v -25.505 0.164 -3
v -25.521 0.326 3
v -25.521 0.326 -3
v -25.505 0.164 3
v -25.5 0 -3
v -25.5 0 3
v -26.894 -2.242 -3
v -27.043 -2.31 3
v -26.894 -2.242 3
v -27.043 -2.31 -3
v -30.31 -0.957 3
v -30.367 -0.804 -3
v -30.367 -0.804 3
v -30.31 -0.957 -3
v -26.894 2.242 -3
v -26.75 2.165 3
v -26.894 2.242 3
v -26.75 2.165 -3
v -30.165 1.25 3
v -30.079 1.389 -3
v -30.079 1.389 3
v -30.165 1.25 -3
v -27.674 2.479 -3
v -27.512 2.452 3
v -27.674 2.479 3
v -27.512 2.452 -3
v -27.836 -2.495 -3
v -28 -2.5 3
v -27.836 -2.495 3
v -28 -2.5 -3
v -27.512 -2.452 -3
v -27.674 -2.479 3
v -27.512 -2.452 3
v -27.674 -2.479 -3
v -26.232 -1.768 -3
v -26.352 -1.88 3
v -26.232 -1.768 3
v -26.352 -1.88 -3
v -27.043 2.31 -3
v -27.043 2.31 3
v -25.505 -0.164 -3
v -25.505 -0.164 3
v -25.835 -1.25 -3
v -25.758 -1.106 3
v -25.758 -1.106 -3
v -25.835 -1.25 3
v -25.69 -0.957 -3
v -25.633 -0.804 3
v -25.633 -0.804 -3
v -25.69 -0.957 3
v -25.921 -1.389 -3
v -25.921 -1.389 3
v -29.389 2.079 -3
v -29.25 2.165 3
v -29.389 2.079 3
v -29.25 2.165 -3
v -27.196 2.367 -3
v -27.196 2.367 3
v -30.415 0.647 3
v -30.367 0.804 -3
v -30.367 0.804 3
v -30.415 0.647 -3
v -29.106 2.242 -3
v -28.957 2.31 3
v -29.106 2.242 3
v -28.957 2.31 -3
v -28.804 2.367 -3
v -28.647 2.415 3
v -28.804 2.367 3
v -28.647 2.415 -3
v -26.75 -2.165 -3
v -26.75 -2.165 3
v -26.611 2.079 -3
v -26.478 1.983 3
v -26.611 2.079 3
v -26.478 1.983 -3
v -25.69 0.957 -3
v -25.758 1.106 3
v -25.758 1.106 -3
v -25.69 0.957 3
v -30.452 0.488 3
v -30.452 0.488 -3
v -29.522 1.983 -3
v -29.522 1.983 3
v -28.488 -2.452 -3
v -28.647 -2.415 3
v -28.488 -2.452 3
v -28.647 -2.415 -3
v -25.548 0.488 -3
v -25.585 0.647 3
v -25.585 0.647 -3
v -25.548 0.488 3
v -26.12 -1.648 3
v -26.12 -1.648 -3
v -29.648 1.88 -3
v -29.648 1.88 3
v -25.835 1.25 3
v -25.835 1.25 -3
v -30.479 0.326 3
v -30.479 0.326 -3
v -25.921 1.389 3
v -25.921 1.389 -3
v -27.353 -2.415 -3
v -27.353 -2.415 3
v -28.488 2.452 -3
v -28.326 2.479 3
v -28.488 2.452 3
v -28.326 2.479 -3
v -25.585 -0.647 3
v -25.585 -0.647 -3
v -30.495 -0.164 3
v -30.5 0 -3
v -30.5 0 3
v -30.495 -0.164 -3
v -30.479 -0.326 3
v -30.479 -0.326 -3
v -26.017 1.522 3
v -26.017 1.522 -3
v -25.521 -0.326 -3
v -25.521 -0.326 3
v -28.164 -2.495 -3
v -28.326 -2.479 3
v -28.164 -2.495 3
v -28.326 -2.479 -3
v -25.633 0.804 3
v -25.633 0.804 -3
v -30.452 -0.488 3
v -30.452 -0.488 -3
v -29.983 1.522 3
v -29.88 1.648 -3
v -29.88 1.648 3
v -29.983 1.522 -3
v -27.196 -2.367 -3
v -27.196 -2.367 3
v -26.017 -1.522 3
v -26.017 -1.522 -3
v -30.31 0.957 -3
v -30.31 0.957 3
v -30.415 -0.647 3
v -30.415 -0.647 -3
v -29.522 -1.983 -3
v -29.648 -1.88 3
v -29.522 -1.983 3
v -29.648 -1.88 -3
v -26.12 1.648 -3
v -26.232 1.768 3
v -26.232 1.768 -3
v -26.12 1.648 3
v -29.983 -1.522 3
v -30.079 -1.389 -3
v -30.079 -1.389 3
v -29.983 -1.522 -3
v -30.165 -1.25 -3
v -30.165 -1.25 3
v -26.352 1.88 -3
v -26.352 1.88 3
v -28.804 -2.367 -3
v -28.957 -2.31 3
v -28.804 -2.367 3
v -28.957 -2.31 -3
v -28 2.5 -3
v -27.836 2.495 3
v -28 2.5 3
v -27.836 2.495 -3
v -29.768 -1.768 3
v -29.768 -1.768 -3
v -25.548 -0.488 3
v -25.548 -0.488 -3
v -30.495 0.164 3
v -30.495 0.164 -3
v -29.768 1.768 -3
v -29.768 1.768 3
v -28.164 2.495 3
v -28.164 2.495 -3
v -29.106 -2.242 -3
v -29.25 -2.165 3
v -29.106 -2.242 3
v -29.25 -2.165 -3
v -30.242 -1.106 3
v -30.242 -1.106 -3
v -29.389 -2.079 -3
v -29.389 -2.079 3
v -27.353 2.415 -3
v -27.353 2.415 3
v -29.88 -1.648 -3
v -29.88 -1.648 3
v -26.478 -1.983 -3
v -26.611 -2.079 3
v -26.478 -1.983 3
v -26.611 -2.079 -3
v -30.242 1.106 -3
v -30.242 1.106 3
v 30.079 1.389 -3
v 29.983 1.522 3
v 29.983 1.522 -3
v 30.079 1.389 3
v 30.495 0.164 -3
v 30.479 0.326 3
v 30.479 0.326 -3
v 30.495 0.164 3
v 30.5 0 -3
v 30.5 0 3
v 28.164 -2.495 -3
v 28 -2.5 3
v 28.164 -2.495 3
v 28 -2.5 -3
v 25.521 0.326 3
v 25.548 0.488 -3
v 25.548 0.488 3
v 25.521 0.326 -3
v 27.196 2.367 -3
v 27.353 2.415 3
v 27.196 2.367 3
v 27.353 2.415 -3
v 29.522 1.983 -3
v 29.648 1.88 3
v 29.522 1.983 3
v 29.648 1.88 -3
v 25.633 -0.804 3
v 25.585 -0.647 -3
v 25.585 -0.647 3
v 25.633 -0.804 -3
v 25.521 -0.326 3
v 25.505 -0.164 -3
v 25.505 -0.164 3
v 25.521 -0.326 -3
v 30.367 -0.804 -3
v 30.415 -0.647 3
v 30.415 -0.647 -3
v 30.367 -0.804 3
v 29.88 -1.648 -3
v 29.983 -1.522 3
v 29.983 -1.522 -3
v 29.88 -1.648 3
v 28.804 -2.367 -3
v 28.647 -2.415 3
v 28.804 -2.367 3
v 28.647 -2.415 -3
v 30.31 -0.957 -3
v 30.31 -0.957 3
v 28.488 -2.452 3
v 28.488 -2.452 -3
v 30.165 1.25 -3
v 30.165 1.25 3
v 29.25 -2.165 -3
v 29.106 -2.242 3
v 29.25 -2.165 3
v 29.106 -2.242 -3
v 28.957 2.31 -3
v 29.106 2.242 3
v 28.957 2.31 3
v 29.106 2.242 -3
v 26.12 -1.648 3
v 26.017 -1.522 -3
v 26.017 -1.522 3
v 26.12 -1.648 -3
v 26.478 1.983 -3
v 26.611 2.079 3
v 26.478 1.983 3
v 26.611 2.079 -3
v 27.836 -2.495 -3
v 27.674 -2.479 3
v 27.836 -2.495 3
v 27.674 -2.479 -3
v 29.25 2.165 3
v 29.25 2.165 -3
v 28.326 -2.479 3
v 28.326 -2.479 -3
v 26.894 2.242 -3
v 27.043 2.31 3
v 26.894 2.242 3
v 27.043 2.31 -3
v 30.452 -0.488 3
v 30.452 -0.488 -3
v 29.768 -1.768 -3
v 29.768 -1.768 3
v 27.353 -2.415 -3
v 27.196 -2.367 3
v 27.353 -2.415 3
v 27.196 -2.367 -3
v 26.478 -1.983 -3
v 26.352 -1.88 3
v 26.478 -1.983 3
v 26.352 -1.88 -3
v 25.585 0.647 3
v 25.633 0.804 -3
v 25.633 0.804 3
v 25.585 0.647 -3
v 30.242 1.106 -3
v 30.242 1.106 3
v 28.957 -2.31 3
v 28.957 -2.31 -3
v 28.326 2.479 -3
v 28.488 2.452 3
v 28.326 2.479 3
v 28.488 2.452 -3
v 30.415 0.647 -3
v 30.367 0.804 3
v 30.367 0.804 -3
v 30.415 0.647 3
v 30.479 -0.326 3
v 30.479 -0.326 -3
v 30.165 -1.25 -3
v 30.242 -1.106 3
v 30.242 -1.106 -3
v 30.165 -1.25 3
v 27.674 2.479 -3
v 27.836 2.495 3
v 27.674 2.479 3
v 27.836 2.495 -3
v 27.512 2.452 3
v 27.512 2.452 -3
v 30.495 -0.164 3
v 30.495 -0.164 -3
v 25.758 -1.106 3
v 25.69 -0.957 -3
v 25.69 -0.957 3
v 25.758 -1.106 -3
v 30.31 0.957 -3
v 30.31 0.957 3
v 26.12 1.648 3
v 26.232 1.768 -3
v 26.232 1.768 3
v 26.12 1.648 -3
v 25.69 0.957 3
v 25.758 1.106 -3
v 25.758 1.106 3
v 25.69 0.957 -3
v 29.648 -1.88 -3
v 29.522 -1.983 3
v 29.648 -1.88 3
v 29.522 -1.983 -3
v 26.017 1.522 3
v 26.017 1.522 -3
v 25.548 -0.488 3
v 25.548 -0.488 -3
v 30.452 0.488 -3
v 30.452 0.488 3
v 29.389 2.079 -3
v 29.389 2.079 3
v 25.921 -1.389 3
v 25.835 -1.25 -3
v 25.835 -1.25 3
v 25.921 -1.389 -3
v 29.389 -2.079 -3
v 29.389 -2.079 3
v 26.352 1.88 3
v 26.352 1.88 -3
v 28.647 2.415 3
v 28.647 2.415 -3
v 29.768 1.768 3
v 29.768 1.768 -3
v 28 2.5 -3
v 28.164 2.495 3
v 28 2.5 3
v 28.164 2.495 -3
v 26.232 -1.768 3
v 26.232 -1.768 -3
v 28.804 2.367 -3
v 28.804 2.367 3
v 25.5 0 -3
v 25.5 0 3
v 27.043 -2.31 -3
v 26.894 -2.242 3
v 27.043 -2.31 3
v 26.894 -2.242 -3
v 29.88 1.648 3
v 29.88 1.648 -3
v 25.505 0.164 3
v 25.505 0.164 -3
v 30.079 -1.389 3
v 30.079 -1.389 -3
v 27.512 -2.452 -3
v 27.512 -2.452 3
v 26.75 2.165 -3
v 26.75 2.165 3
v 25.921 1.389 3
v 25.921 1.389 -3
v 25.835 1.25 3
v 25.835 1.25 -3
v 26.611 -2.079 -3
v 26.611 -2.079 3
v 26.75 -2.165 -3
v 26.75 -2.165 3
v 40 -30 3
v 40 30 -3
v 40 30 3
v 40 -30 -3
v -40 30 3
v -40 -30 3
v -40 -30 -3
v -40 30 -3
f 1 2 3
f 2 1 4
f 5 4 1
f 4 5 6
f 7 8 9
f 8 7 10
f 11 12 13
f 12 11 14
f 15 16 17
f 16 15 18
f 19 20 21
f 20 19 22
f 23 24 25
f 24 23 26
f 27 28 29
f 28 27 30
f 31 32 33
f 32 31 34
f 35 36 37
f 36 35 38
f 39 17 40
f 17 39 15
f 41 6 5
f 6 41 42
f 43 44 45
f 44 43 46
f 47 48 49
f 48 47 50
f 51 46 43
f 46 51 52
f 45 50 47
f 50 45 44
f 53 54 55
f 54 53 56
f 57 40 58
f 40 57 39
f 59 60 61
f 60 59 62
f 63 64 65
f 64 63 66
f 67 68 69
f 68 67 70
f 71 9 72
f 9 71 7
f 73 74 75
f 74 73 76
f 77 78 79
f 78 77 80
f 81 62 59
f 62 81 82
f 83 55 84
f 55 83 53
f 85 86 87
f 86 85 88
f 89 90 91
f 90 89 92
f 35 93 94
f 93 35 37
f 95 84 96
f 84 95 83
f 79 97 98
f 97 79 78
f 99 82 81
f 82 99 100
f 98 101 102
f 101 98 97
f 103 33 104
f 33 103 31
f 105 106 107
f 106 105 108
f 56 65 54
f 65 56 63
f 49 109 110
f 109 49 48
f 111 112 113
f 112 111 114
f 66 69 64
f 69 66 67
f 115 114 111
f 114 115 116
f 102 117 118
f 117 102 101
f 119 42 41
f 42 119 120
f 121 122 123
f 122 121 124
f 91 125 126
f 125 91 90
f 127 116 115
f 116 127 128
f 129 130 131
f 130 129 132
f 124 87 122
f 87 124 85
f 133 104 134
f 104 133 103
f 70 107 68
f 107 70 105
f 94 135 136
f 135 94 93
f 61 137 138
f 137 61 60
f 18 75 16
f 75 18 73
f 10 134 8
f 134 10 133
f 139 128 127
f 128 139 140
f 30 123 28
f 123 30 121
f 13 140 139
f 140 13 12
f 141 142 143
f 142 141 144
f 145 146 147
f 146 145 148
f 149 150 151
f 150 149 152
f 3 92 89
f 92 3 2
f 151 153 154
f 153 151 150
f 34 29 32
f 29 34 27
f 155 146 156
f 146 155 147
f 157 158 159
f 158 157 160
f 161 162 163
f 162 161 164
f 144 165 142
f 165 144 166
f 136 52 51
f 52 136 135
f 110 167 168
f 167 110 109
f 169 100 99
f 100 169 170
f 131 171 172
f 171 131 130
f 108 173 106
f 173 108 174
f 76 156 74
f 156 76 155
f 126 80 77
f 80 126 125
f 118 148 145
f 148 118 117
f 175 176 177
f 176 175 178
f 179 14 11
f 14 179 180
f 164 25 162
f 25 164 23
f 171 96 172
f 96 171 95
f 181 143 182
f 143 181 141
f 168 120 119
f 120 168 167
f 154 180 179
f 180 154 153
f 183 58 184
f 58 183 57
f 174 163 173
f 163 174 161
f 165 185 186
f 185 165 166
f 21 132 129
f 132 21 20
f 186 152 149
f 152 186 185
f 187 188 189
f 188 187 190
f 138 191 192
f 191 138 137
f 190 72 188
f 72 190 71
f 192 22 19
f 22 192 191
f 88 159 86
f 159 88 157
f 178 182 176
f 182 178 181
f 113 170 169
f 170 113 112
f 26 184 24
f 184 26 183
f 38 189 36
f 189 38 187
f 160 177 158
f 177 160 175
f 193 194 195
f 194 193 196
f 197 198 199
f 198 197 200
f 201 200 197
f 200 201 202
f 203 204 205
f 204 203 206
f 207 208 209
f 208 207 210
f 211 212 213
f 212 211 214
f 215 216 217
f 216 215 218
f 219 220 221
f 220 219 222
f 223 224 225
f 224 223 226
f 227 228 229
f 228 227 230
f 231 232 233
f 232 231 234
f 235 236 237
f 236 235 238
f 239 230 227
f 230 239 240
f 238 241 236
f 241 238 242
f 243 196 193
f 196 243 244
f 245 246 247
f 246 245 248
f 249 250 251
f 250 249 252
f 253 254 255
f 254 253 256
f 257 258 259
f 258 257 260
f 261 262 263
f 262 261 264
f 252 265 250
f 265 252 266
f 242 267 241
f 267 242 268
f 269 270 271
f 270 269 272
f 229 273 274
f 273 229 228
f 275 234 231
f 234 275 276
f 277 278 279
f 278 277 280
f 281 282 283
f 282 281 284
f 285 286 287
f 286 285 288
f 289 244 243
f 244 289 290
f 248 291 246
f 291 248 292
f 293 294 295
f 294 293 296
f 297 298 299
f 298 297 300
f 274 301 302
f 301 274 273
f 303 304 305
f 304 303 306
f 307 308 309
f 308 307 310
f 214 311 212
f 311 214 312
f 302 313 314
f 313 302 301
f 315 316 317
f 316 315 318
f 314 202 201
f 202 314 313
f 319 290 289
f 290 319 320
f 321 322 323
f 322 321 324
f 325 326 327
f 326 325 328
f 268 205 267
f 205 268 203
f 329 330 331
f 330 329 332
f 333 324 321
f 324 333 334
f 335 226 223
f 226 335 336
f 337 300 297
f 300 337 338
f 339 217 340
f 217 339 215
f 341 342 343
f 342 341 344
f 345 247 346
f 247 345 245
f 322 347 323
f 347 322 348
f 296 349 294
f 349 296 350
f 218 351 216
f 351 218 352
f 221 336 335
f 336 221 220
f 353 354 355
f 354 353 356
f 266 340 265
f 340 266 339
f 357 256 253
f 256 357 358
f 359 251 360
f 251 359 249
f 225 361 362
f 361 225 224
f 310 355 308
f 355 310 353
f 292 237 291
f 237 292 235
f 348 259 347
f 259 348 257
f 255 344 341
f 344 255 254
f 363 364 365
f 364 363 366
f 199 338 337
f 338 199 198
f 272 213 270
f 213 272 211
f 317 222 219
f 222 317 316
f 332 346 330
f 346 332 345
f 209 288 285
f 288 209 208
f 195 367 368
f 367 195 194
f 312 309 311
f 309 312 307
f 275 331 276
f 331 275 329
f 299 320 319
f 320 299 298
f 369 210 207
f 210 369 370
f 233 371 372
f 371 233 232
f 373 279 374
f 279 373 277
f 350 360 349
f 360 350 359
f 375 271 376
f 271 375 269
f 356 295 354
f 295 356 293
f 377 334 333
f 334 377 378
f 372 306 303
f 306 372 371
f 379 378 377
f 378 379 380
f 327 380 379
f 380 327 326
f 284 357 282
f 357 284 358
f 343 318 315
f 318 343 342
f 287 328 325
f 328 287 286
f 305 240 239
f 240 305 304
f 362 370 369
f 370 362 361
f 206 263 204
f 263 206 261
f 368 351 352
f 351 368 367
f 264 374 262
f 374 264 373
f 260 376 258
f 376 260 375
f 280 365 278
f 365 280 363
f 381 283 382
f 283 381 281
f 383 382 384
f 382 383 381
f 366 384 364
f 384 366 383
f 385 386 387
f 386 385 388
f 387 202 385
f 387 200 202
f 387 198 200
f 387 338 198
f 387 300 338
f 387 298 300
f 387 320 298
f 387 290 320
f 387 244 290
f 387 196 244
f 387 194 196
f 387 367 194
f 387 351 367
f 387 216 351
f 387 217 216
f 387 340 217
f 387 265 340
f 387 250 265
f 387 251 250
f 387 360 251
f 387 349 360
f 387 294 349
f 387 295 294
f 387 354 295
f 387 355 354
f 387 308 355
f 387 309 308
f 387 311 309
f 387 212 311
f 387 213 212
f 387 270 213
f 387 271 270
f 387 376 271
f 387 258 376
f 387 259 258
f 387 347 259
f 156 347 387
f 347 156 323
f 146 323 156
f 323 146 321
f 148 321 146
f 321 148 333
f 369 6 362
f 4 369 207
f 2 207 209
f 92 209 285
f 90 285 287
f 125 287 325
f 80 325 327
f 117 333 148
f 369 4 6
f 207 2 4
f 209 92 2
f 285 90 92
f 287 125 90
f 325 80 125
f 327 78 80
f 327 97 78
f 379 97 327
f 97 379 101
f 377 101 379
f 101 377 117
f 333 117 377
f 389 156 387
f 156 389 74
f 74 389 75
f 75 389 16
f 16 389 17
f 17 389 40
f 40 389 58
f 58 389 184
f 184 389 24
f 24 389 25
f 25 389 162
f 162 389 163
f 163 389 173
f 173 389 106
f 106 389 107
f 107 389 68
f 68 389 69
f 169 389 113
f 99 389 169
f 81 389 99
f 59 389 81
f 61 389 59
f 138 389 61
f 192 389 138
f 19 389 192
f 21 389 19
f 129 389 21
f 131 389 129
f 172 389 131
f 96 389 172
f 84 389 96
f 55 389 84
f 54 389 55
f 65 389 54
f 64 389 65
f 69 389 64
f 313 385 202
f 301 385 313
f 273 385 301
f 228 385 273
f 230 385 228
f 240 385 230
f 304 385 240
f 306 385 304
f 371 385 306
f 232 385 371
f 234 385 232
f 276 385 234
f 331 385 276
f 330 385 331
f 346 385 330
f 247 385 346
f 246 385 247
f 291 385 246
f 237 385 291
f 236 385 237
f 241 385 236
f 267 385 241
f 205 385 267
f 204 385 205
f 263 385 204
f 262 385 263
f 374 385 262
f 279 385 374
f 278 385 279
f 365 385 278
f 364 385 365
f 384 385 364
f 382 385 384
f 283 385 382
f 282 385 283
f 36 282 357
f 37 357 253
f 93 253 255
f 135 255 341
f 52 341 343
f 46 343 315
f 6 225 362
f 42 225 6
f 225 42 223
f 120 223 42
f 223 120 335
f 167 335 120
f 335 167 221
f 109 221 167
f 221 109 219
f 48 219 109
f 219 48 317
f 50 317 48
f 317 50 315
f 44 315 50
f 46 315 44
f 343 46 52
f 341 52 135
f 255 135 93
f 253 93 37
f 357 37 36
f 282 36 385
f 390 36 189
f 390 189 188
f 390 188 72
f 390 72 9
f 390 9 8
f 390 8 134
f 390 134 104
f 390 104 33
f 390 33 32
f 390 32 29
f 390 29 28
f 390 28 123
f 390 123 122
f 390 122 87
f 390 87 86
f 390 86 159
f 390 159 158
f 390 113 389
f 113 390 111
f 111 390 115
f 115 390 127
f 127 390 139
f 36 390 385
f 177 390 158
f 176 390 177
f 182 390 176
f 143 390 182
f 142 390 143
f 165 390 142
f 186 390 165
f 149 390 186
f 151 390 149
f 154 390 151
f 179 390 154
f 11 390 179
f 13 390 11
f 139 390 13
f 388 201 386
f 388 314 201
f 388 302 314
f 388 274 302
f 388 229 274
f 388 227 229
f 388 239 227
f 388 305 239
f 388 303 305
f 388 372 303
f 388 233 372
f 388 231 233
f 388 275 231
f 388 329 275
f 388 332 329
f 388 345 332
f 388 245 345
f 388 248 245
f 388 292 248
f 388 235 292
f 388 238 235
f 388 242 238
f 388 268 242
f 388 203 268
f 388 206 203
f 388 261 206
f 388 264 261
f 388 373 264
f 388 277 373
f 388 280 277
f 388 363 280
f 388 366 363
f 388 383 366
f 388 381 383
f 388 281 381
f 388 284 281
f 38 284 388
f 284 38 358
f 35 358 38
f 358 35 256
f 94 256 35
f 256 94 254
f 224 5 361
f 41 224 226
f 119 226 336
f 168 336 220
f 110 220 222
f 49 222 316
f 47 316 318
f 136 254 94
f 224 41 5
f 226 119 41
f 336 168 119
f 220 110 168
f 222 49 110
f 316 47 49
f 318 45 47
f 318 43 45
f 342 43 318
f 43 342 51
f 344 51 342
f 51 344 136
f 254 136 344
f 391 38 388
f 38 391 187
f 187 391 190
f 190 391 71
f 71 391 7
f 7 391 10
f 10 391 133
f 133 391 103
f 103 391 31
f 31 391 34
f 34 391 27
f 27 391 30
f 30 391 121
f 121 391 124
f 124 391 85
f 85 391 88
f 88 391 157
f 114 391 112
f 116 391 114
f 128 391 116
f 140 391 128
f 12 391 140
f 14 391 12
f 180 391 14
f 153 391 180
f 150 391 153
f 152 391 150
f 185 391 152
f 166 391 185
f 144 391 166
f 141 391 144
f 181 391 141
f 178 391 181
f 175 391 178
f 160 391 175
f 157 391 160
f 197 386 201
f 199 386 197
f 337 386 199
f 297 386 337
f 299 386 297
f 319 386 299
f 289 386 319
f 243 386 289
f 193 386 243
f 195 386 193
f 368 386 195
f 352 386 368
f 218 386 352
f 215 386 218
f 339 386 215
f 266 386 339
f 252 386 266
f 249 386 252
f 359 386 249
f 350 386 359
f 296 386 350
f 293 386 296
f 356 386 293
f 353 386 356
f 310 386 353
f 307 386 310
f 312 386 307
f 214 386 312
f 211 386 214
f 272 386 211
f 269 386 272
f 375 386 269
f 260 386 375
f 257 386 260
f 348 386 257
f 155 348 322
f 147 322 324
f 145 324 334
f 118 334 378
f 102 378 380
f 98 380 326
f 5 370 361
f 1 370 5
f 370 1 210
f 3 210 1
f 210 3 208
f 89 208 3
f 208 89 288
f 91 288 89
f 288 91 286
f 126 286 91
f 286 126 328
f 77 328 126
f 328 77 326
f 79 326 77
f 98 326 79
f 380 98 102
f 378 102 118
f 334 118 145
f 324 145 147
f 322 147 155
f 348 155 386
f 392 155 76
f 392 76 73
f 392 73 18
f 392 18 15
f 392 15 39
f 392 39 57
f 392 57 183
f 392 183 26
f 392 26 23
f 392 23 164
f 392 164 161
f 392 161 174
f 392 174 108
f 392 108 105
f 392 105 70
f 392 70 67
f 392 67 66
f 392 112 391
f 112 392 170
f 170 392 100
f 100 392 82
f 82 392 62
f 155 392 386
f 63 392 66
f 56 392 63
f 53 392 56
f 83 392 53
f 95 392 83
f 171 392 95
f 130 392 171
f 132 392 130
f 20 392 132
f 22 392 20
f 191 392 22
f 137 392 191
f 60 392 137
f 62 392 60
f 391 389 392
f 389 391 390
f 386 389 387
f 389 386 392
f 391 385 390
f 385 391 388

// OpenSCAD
// Одна и та же деталь для теста трёх CAD: плита 80×60×6, два отверстия ø5.
// Ровно та же геометрия, что в plate.f3d (ФОРМА), plate_part.py (FreeCAD)
// и в эталонном расчёте: 28,8 − 0,236 = 28,564 см³.
$fn = 96;

difference() {
    cube([80, 60, 6], center = true);
    for (x = [-28, 28]) {
        translate([x, 0, 0]) cylinder(h = 20, r = 2.5, center = true);
    }
}
